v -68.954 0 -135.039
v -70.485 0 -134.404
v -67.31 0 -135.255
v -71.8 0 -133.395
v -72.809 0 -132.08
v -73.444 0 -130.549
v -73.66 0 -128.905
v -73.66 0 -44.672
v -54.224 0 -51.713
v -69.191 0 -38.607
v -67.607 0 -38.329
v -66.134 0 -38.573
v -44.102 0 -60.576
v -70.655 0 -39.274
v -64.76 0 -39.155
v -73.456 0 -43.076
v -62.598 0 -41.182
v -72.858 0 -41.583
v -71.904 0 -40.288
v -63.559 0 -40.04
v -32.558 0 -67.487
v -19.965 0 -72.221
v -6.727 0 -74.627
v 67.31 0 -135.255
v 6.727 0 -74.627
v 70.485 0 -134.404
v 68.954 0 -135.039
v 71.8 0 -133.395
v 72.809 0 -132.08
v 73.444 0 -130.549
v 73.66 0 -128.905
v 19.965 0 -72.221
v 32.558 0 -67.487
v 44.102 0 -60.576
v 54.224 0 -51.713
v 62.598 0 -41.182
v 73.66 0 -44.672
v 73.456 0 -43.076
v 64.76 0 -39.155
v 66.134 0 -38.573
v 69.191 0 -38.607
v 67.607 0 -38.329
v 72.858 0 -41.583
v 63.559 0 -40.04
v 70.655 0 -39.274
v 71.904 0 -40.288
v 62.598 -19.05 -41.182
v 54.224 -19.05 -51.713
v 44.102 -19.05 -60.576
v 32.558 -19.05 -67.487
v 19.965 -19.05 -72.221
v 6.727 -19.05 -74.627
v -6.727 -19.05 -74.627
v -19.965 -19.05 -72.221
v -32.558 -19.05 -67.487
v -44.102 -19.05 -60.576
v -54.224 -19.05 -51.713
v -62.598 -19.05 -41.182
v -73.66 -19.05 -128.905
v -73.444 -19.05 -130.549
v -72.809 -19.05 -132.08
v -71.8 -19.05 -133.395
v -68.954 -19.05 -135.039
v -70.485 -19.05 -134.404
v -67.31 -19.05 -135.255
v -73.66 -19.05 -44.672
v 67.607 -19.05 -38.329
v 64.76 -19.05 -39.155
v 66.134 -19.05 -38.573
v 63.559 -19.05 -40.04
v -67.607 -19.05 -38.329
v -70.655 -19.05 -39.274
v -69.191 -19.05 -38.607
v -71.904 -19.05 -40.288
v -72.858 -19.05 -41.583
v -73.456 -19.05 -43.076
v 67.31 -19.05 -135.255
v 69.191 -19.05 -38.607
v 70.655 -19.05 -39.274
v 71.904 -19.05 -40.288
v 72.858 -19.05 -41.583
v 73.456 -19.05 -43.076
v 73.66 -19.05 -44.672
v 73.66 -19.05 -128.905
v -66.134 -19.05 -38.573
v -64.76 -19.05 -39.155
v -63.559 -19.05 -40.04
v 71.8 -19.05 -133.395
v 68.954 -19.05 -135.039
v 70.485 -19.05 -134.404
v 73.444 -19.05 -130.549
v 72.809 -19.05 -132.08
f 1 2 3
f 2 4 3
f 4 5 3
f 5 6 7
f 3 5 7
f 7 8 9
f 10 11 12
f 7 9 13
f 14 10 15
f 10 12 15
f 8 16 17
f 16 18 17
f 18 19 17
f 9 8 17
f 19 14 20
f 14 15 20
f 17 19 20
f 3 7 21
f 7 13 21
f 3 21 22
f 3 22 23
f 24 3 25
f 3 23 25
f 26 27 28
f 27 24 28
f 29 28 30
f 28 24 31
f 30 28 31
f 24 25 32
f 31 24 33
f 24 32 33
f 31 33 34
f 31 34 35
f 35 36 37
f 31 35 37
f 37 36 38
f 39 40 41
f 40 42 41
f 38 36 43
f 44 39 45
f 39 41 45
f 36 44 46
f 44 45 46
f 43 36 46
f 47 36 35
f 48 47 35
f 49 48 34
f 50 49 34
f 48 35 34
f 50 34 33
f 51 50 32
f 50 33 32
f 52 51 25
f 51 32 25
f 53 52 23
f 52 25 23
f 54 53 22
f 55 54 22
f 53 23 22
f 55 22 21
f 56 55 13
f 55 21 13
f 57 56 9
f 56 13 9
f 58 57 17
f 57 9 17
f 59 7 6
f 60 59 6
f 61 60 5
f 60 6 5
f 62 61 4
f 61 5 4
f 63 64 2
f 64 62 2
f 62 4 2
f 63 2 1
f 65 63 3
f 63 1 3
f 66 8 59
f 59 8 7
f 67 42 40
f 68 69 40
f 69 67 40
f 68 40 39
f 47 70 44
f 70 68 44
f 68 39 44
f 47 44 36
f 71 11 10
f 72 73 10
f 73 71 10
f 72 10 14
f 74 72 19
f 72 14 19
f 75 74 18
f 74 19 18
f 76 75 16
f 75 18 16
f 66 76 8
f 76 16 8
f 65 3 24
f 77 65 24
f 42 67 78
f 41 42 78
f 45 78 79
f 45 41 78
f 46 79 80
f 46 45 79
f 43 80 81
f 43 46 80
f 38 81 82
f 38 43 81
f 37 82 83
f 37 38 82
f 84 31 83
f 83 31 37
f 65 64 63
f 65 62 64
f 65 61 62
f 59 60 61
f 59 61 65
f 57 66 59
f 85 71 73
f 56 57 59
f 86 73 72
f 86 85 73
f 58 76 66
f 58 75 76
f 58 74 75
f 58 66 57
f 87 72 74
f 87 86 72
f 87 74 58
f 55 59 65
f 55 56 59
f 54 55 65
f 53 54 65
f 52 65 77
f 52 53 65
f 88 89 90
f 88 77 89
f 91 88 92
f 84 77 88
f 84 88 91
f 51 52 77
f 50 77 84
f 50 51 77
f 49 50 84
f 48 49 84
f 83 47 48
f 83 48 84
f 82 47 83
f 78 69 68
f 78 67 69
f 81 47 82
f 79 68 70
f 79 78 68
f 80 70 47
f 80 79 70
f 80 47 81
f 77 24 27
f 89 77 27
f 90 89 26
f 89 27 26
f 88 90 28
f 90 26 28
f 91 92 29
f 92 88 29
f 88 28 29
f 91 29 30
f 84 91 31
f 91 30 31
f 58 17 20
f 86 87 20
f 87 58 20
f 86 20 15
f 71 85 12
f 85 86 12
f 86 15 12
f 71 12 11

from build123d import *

# Parameters (mm, degrees)
F1_DEPTH    = 19.05
F2_T1_DEPTH = 50.8
F2_T3_DEPTH = 36.6217233344


# Not quite as in the source:
# - a fillet or chamfer that OpenCascade refuses, or shapes differently, is made with other operations: its cross-section is extruded or revolved along the edge and cut away or added


with BuildPart() as f1:
    # F0 (on Front) → F1 (new body)
    with BuildSketch(Plane.XZ):
        with BuildLine():
            ThreePointArc((64.3887874714, -38.322173059), (0, -74.93), (-64.3887874714, -38.322173059))
            Line((-64.3887874714, -38.322173059), (-73.66, -38.322173059))
            Line((-73.66, -38.322173059), (-73.66, -135.255))
            Line((-73.66, -135.255), (73.66, -135.255))
            Line((73.66, -135.255), (73.66, -38.322173059))
            Line((73.66, -38.322173059), (64.3887874714, -38.322173059))
        make_face()
    extrude(amount=F1_DEPTH)

    # F2: fillet of radius 6.35 on 6 edges, made by hand

    # F2_s2 → F2_t1 (cut)
    with BuildSketch(Plane.XZ.offset(-15.875)):
        with BuildLine():
            ThreePointArc((67.31, -38.322173059), (71.8001280605, -40.1820449985), (73.66, -44.672173059))
            Line((73.66, -44.672173059), (73.66, -38.322173059))
            Line((73.66, -38.322173059), (67.31, -38.322173059))
        make_face()
        with BuildLine():
            ThreePointArc((-67.31, -38.322173059), (-71.8001280605, -40.1820449985), (-73.66, -44.672173059))
            Line((-73.66, -44.672173059), (-73.66, -38.322173059))
            Line((-73.66, -38.322173059), (-67.31, -38.322173059))
        make_face()
        with BuildLine():
            ThreePointArc((67.31, -135.255), (71.8001280605, -133.3951280605), (73.66, -128.905))
            Line((73.66, -128.905), (73.66, -135.255))
            Line((73.66, -135.255), (67.31, -135.255))
        make_face()
        with BuildLine():
            ThreePointArc((-73.66, -128.905), (-71.8001280605, -133.3951280605), (-67.31, -135.255))
            Line((-67.31, -135.255), (-73.66, -135.255))
            Line((-73.66, -135.255), (-73.66, -128.905))
        make_face()
    extrude(amount=F2_T1_DEPTH, mode=Mode.SUBTRACT)

    # F2_s4 → F2_t3 (cut)
    with BuildSketch(Plane.XZ.offset(-8.7858616672)):
        with BuildLine():
            ThreePointArc((-62.59819994, -41.1821595388), (-64.889752462, -39.0827148628), (-67.9031321383, -38.322173059))
            Line((-67.9031321383, -38.322173059), (-64.3887874714, -38.322173059))
            ThreePointArc((-64.3887874714, -38.322173059), (-63.5095947367, -39.7622468729), (-62.59819994, -41.1821595388))
        make_face()
        with BuildLine():
            ThreePointArc((67.9031321383, -38.322173059), (64.889752462, -39.0827148628), (62.59819994, -41.1821595388))
            ThreePointArc((62.59819994, -41.1821595388), (63.5095947367, -39.7622468729), (64.3887874714, -38.322173059))
            Line((64.3887874714, -38.322173059), (67.9031321383, -38.322173059))
        make_face()
    extrude(amount=F2_T3_DEPTH, mode=Mode.SUBTRACT)


solid = f1.part
